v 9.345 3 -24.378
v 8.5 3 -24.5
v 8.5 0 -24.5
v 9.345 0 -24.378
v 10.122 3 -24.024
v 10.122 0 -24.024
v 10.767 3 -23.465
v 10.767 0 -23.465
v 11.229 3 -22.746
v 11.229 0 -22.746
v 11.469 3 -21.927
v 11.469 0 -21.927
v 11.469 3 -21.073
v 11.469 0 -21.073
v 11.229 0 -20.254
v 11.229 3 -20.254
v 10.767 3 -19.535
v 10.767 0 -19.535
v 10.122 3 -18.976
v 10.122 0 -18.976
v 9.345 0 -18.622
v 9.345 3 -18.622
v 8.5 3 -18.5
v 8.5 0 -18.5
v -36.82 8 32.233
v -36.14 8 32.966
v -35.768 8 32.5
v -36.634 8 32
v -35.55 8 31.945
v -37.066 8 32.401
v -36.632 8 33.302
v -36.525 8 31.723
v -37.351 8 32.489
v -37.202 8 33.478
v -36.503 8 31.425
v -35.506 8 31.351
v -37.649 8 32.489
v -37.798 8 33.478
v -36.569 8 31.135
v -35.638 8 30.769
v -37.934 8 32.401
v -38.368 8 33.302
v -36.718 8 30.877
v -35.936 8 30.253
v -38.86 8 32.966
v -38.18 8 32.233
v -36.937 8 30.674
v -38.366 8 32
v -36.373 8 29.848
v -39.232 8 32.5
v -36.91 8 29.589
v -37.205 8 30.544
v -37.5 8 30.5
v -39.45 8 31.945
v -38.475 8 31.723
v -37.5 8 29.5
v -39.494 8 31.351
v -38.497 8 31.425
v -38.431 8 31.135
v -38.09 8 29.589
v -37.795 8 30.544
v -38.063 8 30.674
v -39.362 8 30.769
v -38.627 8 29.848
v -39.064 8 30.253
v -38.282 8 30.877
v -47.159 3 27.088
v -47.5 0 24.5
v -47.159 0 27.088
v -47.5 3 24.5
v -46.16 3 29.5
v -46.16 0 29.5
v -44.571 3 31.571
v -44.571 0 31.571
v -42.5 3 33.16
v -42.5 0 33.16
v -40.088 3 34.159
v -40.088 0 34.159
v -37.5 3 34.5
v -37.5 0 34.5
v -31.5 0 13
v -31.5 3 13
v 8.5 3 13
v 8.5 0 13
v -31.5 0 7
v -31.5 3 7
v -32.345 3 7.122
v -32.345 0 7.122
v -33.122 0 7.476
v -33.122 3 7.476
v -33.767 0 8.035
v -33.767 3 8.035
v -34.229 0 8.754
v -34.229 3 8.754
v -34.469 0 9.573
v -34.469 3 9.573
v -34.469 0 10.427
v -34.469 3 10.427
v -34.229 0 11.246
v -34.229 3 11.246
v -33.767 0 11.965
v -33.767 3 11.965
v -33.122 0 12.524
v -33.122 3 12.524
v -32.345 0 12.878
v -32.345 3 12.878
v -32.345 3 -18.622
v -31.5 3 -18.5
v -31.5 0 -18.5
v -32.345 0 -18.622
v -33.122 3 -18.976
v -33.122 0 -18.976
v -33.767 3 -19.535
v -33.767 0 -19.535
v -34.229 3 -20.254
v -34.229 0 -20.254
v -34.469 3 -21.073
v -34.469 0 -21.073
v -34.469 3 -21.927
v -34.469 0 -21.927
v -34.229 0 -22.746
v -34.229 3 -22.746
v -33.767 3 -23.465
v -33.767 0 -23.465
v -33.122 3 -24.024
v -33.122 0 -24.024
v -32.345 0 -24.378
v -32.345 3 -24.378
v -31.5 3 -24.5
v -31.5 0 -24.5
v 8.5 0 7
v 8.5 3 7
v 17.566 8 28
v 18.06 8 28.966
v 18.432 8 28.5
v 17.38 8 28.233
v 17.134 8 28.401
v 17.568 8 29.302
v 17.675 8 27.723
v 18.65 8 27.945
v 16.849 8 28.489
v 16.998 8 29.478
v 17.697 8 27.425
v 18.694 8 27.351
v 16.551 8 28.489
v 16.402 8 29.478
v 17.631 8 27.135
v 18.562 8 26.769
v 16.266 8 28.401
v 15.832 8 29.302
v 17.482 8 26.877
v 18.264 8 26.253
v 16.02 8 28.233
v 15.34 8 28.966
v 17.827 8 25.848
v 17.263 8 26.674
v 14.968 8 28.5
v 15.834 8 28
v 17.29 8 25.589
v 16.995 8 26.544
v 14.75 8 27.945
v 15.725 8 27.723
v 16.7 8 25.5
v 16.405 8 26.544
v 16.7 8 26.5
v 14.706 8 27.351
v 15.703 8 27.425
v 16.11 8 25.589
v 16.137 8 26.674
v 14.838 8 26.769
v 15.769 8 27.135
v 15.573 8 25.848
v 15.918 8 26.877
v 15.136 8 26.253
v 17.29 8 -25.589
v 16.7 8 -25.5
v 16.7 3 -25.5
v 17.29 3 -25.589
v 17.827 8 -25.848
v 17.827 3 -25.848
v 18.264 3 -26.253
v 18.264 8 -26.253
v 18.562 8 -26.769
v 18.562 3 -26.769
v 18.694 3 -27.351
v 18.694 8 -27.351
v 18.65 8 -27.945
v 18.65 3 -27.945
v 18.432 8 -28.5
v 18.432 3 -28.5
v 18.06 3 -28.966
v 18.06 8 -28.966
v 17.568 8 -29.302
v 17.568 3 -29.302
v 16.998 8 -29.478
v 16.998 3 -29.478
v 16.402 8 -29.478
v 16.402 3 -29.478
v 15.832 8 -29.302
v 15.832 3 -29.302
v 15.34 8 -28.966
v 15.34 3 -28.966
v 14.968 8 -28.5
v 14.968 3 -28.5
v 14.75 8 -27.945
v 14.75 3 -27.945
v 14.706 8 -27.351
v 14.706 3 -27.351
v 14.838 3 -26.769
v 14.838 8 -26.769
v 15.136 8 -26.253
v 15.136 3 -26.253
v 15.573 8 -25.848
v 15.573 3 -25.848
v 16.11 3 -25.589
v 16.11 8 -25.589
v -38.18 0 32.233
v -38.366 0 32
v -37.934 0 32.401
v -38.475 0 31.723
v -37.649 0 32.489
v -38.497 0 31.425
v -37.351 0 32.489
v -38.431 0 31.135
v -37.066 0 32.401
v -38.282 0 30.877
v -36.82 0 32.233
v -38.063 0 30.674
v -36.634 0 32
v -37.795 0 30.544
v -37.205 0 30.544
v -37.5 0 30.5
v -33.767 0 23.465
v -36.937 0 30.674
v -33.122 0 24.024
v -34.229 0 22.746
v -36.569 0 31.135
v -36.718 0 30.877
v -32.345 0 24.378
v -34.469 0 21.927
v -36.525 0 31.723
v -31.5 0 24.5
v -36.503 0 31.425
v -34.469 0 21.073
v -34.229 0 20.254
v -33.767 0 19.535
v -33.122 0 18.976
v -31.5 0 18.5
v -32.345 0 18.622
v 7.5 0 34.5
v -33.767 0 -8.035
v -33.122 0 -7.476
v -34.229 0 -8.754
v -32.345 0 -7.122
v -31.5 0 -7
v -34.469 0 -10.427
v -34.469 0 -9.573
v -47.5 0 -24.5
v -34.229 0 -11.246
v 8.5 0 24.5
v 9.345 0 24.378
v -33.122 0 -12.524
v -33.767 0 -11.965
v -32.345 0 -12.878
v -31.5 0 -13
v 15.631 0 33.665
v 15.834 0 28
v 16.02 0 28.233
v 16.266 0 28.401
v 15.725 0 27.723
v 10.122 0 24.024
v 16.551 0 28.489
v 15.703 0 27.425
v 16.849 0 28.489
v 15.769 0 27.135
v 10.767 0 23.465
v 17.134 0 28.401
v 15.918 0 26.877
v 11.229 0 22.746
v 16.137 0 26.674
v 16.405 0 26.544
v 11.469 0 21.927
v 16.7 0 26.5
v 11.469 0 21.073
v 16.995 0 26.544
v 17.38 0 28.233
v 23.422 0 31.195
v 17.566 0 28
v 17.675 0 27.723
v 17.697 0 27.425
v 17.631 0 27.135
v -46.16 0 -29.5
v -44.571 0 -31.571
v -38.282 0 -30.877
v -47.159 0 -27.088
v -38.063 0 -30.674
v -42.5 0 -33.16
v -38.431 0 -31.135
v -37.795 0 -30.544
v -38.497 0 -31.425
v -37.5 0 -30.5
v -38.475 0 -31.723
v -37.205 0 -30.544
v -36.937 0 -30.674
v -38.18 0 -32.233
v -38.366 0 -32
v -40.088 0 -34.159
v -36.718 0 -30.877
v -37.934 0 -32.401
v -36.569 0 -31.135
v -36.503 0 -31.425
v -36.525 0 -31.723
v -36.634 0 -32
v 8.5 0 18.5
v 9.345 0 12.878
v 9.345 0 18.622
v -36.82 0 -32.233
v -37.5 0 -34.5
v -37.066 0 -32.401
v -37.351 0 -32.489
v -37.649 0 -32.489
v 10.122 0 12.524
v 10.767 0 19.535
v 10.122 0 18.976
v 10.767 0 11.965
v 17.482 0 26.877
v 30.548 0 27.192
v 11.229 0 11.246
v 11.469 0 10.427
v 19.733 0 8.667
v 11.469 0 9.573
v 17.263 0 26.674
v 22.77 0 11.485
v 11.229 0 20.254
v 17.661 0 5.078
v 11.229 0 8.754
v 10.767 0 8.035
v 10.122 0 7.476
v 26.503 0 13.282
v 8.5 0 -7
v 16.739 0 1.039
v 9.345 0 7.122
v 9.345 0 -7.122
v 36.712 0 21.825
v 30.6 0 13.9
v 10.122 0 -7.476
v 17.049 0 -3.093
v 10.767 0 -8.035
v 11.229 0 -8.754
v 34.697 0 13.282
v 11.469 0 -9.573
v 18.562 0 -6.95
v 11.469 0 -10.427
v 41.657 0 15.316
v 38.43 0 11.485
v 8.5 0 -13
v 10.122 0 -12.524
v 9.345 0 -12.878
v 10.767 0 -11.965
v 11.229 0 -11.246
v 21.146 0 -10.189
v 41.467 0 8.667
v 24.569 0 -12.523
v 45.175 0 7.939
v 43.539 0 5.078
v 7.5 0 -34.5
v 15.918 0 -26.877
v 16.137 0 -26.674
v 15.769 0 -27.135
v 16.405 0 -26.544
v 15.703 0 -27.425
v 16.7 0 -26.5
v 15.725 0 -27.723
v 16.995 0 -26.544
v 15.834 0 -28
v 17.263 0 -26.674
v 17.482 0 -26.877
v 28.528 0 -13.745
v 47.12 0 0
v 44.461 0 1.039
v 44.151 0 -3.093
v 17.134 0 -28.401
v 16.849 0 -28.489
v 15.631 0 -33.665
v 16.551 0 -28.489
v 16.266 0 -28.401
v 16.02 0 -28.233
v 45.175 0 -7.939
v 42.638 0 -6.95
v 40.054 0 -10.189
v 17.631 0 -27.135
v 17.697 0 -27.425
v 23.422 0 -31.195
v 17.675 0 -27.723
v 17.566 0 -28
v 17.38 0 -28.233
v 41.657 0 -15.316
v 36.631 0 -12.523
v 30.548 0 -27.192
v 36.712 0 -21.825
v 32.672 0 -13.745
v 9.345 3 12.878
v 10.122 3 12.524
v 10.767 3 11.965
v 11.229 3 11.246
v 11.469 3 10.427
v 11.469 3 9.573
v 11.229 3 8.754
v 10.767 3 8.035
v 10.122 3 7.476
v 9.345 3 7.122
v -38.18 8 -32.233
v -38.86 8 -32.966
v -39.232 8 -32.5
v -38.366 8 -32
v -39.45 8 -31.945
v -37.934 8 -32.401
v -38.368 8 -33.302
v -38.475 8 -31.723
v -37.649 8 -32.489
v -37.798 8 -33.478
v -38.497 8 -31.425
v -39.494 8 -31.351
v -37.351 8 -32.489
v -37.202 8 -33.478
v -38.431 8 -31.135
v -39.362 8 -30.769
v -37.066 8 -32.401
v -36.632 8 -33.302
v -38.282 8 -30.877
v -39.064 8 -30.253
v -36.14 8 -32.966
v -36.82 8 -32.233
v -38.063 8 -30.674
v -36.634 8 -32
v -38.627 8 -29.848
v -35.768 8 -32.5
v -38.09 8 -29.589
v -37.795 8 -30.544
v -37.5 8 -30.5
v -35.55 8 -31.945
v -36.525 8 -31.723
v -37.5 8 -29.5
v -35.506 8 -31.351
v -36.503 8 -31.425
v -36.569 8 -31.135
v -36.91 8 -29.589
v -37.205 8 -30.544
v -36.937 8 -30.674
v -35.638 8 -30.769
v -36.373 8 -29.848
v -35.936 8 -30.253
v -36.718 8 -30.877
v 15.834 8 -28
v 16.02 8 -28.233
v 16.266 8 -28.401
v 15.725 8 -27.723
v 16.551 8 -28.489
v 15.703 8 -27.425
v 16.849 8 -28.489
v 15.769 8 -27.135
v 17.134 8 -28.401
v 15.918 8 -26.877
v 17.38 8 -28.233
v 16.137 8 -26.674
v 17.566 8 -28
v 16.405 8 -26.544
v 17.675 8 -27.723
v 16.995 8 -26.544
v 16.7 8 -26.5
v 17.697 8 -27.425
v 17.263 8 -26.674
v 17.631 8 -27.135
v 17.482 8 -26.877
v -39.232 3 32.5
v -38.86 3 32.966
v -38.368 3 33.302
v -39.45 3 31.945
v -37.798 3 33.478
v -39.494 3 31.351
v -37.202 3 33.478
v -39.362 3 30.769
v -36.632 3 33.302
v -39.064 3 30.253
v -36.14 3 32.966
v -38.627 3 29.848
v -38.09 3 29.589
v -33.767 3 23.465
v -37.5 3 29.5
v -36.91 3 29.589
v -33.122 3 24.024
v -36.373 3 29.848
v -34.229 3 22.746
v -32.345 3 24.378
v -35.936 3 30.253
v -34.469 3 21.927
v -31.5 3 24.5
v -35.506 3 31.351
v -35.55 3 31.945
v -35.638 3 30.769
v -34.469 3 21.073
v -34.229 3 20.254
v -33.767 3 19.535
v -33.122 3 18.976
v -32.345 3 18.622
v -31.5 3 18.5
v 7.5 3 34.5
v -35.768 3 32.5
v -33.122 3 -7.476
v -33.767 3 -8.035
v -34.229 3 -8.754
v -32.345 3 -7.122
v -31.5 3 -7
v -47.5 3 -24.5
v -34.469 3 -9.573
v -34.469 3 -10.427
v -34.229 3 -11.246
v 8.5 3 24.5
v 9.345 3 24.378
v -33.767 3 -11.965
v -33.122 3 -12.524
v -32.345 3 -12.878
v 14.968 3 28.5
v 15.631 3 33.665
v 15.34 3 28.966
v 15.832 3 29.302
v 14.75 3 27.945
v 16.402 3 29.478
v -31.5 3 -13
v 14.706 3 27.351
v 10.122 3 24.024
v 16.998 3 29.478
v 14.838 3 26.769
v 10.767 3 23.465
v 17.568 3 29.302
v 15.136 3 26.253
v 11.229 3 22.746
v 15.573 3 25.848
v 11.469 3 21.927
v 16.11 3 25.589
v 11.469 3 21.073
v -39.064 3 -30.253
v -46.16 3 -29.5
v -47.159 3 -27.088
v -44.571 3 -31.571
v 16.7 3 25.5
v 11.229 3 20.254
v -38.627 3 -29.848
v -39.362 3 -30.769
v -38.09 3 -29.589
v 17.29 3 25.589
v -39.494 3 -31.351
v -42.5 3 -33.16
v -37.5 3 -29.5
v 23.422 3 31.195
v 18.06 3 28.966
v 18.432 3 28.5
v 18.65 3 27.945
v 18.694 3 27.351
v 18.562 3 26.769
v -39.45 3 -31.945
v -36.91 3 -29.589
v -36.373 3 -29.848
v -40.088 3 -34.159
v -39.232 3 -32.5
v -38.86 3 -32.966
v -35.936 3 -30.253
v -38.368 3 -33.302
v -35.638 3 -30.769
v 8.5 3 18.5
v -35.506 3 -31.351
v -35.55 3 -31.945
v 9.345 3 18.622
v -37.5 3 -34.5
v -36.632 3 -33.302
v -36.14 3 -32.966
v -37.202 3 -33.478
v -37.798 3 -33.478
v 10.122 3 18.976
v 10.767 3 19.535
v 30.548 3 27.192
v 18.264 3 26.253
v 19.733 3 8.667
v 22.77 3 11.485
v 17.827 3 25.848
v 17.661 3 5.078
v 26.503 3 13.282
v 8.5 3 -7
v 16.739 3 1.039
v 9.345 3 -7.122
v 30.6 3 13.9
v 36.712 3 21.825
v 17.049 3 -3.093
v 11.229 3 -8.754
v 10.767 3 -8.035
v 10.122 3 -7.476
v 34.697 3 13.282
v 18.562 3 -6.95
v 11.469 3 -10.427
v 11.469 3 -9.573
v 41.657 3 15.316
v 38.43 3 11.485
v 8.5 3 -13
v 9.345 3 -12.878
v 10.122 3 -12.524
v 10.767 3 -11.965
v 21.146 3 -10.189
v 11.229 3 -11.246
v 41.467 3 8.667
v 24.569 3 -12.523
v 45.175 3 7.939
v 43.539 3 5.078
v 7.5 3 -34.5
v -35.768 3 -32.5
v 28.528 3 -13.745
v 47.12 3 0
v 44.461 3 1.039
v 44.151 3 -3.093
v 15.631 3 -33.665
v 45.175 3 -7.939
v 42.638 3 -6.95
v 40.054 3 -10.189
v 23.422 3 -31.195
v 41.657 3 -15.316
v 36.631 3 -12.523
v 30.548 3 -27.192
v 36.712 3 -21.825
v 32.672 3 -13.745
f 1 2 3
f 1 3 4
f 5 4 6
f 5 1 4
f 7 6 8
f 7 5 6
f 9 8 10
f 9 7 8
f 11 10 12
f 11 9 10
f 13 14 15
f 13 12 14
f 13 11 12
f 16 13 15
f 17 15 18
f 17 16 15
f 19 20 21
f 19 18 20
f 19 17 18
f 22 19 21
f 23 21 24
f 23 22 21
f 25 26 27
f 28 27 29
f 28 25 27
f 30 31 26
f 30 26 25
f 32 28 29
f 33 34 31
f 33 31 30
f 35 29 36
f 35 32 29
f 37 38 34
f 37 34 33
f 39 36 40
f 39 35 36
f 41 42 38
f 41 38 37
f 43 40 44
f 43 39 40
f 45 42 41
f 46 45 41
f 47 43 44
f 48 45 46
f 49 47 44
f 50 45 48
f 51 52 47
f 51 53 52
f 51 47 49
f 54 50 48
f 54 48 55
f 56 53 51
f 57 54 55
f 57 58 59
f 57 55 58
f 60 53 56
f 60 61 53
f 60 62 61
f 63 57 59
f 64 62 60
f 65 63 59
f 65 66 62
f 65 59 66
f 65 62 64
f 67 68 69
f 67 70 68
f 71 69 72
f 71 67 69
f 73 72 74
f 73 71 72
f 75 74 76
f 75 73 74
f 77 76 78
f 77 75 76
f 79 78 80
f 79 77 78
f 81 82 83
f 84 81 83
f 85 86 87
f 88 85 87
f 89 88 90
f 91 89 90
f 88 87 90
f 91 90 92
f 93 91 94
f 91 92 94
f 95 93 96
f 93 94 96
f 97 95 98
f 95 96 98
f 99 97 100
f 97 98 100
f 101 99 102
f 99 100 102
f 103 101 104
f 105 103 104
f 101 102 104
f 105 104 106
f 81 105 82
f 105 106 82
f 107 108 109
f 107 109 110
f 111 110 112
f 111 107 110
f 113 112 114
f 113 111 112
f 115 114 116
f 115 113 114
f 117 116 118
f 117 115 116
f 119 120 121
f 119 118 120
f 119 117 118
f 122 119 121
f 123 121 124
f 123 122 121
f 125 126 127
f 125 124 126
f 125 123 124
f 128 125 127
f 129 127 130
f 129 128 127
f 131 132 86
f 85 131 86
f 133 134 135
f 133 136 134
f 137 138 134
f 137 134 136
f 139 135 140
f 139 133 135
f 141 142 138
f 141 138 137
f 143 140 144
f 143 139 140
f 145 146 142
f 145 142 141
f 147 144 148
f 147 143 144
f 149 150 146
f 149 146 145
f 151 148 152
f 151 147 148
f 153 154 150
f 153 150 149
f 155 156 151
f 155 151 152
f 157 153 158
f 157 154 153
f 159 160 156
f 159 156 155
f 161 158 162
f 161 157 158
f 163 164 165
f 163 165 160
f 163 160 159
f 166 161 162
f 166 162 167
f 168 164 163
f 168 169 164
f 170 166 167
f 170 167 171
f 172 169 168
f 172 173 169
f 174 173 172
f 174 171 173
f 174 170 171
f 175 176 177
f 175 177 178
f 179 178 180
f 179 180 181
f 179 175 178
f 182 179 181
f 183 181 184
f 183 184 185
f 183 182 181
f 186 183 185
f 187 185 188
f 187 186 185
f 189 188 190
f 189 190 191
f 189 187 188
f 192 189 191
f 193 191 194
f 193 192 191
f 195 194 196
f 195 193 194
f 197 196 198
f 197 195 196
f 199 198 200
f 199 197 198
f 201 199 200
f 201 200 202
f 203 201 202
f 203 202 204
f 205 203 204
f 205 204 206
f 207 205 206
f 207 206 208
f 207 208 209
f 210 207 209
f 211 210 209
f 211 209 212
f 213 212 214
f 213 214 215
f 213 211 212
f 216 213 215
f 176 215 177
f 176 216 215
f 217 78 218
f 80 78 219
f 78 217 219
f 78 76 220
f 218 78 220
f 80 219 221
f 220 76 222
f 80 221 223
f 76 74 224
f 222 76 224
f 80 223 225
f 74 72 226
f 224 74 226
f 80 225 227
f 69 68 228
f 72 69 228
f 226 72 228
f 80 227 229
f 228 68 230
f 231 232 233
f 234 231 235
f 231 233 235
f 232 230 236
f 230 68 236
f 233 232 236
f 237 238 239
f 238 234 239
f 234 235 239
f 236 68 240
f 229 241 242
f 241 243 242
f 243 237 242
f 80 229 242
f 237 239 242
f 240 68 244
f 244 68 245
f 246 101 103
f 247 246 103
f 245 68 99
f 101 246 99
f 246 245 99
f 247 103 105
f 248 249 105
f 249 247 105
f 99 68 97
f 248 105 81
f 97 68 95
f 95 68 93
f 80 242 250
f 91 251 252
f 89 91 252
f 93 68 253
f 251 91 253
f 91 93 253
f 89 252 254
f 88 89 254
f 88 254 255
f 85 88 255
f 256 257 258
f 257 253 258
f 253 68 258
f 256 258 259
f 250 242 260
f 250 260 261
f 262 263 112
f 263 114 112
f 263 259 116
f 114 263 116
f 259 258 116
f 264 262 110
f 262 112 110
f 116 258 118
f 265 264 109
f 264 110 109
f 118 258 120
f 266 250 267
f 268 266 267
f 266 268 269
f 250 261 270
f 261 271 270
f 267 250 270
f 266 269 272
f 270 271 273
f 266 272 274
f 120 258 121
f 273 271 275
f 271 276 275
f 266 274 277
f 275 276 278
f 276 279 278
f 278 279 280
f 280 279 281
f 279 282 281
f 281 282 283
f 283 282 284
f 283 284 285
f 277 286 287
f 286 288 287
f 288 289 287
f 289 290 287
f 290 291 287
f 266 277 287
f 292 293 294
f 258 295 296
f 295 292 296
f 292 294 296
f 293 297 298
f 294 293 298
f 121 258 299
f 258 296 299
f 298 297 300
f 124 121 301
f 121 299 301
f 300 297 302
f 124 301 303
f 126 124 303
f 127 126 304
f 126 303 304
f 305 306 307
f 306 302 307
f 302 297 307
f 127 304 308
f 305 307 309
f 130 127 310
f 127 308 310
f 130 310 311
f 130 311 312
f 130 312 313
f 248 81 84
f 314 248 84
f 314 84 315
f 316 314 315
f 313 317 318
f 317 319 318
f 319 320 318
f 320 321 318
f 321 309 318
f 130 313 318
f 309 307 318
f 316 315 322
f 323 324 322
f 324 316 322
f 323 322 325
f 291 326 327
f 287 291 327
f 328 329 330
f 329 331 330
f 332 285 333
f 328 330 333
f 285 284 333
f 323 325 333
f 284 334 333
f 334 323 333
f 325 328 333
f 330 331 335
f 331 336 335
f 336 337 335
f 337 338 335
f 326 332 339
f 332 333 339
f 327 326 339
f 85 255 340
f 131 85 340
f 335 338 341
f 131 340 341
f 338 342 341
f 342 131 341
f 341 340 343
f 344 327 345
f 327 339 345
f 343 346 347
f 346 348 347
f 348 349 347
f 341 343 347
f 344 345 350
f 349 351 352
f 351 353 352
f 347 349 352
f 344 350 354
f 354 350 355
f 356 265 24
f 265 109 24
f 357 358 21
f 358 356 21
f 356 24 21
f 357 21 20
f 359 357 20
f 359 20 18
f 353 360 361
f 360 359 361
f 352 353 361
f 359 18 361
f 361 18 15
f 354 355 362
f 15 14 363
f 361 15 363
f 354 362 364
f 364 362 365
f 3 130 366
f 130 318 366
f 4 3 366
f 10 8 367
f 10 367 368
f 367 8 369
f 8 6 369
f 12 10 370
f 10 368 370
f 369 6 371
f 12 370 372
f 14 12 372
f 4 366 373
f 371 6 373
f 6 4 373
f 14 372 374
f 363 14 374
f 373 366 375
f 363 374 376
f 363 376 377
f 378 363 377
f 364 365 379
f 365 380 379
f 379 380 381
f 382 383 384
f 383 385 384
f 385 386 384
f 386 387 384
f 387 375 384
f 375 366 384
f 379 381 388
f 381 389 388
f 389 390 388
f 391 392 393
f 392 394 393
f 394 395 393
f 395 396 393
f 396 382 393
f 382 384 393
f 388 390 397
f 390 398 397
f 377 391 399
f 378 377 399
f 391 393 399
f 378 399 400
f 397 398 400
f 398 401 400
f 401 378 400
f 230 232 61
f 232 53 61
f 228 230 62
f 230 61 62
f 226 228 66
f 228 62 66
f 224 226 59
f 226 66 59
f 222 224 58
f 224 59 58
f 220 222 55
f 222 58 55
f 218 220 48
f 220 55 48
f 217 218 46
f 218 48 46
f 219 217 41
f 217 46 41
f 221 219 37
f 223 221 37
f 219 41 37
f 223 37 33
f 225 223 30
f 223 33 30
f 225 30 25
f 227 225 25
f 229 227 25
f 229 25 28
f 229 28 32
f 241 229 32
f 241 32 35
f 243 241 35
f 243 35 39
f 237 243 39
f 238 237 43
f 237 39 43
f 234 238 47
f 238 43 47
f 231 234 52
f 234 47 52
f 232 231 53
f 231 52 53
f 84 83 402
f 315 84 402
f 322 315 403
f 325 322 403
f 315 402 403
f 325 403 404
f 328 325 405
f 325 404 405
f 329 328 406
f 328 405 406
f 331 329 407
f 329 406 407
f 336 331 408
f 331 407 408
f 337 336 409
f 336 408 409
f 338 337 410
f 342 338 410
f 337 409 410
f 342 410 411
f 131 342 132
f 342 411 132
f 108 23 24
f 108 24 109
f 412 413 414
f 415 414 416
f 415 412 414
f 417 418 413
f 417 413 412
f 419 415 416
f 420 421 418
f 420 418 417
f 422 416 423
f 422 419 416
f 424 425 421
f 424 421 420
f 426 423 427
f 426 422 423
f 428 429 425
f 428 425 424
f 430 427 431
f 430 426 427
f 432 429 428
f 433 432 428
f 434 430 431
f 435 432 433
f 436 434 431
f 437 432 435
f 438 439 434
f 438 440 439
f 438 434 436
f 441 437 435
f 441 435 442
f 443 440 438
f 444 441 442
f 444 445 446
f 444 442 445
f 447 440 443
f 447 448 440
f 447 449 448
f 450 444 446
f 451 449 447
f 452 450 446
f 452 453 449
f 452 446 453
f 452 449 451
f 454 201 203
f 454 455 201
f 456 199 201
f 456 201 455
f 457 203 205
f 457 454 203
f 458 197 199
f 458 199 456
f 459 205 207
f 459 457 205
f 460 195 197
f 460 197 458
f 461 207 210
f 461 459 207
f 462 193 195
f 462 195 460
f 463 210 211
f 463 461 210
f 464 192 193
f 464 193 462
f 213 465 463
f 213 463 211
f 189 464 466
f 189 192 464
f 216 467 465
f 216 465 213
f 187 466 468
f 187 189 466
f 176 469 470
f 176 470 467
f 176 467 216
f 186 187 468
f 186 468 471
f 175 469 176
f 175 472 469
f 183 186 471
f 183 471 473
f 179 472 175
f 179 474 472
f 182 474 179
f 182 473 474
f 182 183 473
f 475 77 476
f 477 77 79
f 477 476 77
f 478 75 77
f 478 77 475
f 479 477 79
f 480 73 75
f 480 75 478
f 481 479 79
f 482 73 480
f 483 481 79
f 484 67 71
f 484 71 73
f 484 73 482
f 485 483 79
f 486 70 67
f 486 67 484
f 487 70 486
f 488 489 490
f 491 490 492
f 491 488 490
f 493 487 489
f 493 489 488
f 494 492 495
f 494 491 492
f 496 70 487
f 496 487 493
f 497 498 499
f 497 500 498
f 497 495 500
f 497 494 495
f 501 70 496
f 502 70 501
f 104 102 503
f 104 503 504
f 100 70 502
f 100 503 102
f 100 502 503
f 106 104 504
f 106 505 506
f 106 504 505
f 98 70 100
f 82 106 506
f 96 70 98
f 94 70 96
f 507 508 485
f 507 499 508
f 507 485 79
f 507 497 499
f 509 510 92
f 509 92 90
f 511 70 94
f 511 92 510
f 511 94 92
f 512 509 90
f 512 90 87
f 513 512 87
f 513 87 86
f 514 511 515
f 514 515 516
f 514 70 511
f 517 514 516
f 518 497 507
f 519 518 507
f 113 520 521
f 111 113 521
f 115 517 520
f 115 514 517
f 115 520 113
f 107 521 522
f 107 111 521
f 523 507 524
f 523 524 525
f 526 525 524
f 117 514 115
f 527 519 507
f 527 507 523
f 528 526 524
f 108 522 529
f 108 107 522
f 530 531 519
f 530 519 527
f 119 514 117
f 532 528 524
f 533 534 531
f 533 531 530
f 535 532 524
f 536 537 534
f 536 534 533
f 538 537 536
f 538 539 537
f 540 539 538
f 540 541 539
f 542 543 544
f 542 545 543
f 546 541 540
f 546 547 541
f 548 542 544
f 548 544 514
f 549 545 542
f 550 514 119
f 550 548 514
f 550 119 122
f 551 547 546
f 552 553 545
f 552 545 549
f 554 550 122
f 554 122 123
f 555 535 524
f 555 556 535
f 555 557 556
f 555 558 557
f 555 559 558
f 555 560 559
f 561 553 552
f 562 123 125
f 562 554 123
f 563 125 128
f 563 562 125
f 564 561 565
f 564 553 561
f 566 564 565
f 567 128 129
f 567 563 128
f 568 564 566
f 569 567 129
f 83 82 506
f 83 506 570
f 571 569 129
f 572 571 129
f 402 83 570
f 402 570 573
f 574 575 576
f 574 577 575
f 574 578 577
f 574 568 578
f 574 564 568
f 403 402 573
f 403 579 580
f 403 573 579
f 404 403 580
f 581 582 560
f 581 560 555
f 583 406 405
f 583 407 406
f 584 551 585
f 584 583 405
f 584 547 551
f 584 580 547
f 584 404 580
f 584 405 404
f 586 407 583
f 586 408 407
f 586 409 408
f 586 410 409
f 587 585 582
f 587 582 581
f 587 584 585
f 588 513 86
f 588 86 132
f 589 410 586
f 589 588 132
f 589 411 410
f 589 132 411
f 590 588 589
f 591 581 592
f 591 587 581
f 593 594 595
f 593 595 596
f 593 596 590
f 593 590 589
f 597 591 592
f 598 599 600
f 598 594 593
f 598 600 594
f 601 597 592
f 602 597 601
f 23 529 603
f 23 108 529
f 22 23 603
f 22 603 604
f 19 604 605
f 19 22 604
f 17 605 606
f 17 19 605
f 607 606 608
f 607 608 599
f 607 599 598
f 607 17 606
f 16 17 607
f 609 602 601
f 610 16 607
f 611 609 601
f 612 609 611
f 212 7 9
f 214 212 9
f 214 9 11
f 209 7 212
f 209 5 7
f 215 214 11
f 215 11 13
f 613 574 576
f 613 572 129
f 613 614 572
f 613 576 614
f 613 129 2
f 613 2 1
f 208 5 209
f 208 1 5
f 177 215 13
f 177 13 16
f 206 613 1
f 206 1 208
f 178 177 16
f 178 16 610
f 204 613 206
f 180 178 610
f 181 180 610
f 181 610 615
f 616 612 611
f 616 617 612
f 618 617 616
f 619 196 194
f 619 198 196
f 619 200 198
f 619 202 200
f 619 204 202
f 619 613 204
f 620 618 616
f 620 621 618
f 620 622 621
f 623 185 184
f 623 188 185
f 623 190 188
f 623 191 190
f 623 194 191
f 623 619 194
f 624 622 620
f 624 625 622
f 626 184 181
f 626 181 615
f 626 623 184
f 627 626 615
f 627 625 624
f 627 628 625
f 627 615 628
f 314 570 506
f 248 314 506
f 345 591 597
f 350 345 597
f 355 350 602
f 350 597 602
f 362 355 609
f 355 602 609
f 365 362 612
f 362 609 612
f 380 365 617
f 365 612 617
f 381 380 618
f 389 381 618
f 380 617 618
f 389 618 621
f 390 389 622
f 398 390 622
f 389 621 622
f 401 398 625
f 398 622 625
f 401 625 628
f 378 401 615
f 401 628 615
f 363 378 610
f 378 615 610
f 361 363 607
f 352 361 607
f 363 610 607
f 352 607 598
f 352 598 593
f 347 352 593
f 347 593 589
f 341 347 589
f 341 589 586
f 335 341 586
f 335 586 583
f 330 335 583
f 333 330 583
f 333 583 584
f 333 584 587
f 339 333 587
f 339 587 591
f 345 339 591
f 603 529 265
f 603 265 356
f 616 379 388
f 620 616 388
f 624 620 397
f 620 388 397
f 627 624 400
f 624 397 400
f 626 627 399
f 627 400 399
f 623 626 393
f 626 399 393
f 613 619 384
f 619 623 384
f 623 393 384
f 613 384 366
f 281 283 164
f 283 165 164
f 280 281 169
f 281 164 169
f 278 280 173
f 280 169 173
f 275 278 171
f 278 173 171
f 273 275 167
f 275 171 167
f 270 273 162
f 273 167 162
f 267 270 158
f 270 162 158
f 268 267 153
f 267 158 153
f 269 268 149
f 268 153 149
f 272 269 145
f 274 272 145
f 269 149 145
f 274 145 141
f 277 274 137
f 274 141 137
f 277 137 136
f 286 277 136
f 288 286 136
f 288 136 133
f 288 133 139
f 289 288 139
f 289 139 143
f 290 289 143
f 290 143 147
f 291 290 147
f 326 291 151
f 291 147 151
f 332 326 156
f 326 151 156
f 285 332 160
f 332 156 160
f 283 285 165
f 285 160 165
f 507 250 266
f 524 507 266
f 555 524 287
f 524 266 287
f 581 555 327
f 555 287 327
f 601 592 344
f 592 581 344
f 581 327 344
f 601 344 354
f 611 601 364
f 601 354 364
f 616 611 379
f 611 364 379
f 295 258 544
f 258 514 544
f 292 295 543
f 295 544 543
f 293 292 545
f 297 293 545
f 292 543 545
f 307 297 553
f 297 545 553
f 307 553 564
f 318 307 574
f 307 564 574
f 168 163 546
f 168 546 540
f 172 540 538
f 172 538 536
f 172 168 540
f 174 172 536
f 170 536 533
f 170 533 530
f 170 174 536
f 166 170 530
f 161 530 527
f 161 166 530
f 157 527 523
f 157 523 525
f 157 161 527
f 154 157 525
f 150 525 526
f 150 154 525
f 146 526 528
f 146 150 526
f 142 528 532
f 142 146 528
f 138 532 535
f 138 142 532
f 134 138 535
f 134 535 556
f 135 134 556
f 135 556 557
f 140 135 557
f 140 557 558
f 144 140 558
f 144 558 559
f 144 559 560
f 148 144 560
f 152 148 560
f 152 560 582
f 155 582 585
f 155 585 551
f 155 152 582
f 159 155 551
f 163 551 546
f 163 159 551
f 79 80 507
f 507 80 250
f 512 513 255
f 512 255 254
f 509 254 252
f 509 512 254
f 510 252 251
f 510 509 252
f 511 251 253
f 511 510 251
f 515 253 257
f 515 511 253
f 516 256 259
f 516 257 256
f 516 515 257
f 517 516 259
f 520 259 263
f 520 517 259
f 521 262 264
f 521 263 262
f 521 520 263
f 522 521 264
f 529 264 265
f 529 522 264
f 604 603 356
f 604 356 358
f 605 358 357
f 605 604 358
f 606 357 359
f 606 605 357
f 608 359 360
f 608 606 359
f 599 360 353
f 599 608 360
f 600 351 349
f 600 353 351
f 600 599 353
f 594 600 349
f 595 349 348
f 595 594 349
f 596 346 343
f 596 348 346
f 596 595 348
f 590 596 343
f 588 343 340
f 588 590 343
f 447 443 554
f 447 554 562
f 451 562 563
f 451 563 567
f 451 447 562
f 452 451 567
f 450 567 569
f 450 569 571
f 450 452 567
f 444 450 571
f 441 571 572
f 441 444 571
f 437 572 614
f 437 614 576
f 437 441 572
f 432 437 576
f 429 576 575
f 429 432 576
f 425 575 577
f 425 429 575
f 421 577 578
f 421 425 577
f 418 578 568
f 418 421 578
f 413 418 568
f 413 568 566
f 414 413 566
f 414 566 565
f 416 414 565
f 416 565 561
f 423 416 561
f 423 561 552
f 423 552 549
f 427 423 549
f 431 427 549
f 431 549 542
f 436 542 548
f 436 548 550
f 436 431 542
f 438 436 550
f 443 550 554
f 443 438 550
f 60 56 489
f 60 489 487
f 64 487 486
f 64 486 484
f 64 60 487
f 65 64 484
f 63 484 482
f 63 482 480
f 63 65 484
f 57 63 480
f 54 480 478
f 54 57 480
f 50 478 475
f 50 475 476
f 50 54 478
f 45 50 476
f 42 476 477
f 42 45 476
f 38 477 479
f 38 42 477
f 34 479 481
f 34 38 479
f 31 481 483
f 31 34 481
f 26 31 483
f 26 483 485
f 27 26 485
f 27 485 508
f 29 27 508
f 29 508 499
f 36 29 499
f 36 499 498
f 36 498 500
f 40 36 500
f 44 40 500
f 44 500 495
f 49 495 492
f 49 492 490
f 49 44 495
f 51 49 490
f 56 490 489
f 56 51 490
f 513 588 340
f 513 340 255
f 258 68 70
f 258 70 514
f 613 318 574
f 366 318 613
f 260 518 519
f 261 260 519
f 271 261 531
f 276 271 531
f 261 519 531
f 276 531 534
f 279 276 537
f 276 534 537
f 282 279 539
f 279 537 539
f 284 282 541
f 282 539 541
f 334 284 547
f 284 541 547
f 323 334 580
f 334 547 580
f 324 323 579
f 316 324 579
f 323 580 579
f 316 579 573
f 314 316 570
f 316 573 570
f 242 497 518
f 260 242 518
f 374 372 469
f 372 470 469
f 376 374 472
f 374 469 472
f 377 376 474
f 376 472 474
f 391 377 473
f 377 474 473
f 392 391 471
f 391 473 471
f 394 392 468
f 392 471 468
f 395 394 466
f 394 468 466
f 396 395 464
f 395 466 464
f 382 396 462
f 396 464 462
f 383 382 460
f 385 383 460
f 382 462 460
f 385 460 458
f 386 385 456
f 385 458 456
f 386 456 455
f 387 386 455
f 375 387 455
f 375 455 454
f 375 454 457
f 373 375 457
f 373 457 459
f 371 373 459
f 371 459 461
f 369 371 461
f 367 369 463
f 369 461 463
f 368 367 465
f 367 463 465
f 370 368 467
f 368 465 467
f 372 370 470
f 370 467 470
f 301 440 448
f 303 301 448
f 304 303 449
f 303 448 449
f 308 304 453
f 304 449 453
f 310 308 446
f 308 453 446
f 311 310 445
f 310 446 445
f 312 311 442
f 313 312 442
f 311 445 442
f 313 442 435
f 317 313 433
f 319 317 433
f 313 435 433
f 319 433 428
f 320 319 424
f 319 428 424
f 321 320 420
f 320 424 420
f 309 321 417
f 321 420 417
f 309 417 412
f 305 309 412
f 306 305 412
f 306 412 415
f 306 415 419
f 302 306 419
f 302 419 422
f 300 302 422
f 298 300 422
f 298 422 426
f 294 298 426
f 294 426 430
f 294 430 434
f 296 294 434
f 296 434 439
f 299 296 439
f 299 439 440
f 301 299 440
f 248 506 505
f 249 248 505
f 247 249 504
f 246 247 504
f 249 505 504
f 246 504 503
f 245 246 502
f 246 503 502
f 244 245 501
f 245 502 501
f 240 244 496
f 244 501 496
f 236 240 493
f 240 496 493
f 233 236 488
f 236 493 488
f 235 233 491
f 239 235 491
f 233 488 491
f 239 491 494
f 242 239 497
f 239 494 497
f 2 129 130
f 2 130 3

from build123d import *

# Parameters (mm, degrees)
ESBO_O1_W                = 95
ESBO_O1_H                = 69
RESSALTO_EXTRUS_O1_DEPTH = 3
ESBO_O2_R                = 13.9
CORTE_EXTRUS_O1_DEPTH    = 59.783501087
ESBO_O4_R                = 1
CORTE_EXTRUS_O2_DEPTH    = 59.783501087
RESSALTO_EXTRUS_O2_START = 5
ESBO_O5_R                = 2
ESBO_O5_R_2              = 1
RESSALTO_EXTRUS_O2_DEPTH = 5
FILETE1_R                = 40
FILETE2_R                = 10
CORTE_EXTRUS_O3_DEPTH    = 59.919436521


with BuildPart() as part:
    # Esboço1 → Ressalto-extrusão1 (new body)
    with BuildSketch(Plane(origin=(0, 0, 0), x_dir=(1, 0, 0), z_dir=(0, 1, 0))):
        Rectangle(ESBO_O1_W, ESBO_O1_H)
    extrude(amount=RESSALTO_EXTRUS_O1_DEPTH)

    # Esboço2 → Corte-extrusão1 (cut, through all)
    with BuildSketch(Plane(origin=(0, 3, 0), x_dir=(1, 0, 0), z_dir=(0, 1, 0))):
        with Locations(Location((30.6, 0, 0), (0, 0, 270))):
            Circle(ESBO_O2_R)
    extrude(amount=-CORTE_EXTRUS_O1_DEPTH, mode=Mode.SUBTRACT)

    # Esboço4 → Corte-extrusão2 (cut, through all)
    with BuildSketch(Plane(origin=(0, 3, 0), x_dir=(1, 0, 0), z_dir=(0, 1, 0))):
        with Locations(Location((16.7, 27.5, 0), (0, 0, 270))):
            Circle(ESBO_O4_R)
        with Locations(Location((16.7, -27.5, 0), (0, 0, 90))):
            Circle(ESBO_O4_R)
        with Locations(Location((-37.5, 31.5, 0), (0, 0, 270))):
            Circle(ESBO_O4_R)
        with Locations(Location((-37.5, -31.5, 0), (0, 0, 90))):
            Circle(ESBO_O4_R)
    extrude(amount=-CORTE_EXTRUS_O2_DEPTH, mode=Mode.SUBTRACT)

    # Esboço5 → Ressalto-extrusão2 (add)
    # profile 1 of 4: a face of its own
    with BuildSketch(Plane(origin=(0, 3, 0), x_dir=(1, 0, 0), z_dir=(0, 1, 0)).offset(RESSALTO_EXTRUS_O2_START)):
        with Locations(Location((-37.5, 31.5, 0), (0, 0, 270))):
            Circle(ESBO_O5_R)
        with Locations(Location((-37.5, 31.5, 0), (0, 0, 270))):
            Circle(ESBO_O5_R_2, mode=Mode.SUBTRACT)
    # profile 2 of 4: a face of its own
    with BuildSketch(Plane(origin=(0, 3, 0), x_dir=(1, 0, 0), z_dir=(0, 1, 0)).offset(RESSALTO_EXTRUS_O2_START)):
        with Locations(Location((16.7, 27.5, 0), (0, 0, 270))):
            Circle(ESBO_O5_R)
        with Locations(Location((16.7, 27.5, 0), (0, 0, 270))):
            Circle(ESBO_O5_R_2, mode=Mode.SUBTRACT)
    # profile 3 of 4: a face of its own
    with BuildSketch(Plane(origin=(0, 3, 0), x_dir=(1, 0, 0), z_dir=(0, 1, 0)).offset(RESSALTO_EXTRUS_O2_START)):
        with Locations(Location((16.7, -27.5, 0), (0, 0, 90))):
            Circle(ESBO_O5_R)
        with Locations(Location((16.7, -27.5, 0), (0, 0, 90))):
            Circle(ESBO_O5_R_2, mode=Mode.SUBTRACT)
    # profile 4 of 4: a face of its own
    with BuildSketch(Plane(origin=(0, 3, 0), x_dir=(1, 0, 0), z_dir=(0, 1, 0)).offset(RESSALTO_EXTRUS_O2_START)):
        with Locations(Location((-37.5, -31.5, 0), (0, 0, 90))):
            Circle(ESBO_O5_R)
        with Locations(Location((-37.5, -31.5, 0), (0, 0, 90))):
            Circle(ESBO_O5_R_2, mode=Mode.SUBTRACT)
    extrude(amount=-RESSALTO_EXTRUS_O2_DEPTH)

    # Filete1
    # the kernel refuses this fillet: 40 mm, written as the material it takes off along each edge
    with BuildSketch(Plane(origin=(47.5, -100, -34.5), x_dir=(-1, 0, 0), z_dir=(0, 1, 0))) as filete1_piece_1:
        with BuildLine():
            CenterArc((FILETE1_R, FILETE1_R), FILETE1_R, 180, 90)
            Line((0, FILETE1_R), (0, 0))
            Line((0, 0), (FILETE1_R, 0))
        make_face()
    extrude(amount=203, mode=Mode.SUBTRACT)
    with BuildSketch(Plane(origin=(47.5, -100, 34.5), x_dir=(-1, 0, 0), z_dir=(0, 1, 0))) as filete1_piece_2:
        with BuildLine():
            CenterArc((FILETE1_R, -FILETE1_R), FILETE1_R, 90, 90)
            Line((0, -FILETE1_R), (0, 0))
            Line((0, 0), (FILETE1_R, 0))
        make_face()
    extrude(amount=203, mode=Mode.SUBTRACT)

    # Filete2
    filete2_edges = [part.edges().sort_by_distance(p)[0] for p in [
        (-47.5, 1.5, 34.5),
        (-47.5, 1.5, -34.5),
    ]]
    fillet(filete2_edges, radius=FILETE2_R)

    # Esboço7 → Corte-extrusão3 (cut, through all)
    with BuildSketch(Plane(origin=(0, 3, 0), x_dir=(1, 0, 0), z_dir=(0, 1, 0))):
        with BuildLine():
            Line((-31.5, 13), (8.5, 13))
            ThreePointArc((8.5, 13), (11.5, 10), (8.5, 7))
            Line((8.5, 7), (-31.5, 7))
            ThreePointArc((-31.5, 7), (-34.5, 10), (-31.5, 13))
        make_face()
        with BuildLine():
            Line((-31.5, 24.5), (8.5, 24.5))
            ThreePointArc((8.5, 24.5), (11.5, 21.5), (8.5, 18.5))
            Line((8.5, 18.5), (-31.5, 18.5))
            ThreePointArc((-31.5, 18.5), (-34.5, 21.5), (-31.5, 24.5))
        make_face()
        with BuildLine():
            Line((-31.5, -24.5), (8.5, -24.5))
            ThreePointArc((8.5, -24.5), (11.5, -21.5), (8.5, -18.5))
            Line((8.5, -18.5), (-31.5, -18.5))
            ThreePointArc((-31.5, -18.5), (-34.5, -21.5), (-31.5, -24.5))
        make_face()
        with BuildLine():
            Line((-31.5, -13), (8.5, -13))
            ThreePointArc((8.5, -13), (11.5, -10), (8.5, -7))
            Line((8.5, -7), (-31.5, -7))
            ThreePointArc((-31.5, -7), (-34.5, -10), (-31.5, -13))
        make_face()
    extrude(amount=-CORTE_EXTRUS_O3_DEPTH, mode=Mode.SUBTRACT)


solid = part.part
